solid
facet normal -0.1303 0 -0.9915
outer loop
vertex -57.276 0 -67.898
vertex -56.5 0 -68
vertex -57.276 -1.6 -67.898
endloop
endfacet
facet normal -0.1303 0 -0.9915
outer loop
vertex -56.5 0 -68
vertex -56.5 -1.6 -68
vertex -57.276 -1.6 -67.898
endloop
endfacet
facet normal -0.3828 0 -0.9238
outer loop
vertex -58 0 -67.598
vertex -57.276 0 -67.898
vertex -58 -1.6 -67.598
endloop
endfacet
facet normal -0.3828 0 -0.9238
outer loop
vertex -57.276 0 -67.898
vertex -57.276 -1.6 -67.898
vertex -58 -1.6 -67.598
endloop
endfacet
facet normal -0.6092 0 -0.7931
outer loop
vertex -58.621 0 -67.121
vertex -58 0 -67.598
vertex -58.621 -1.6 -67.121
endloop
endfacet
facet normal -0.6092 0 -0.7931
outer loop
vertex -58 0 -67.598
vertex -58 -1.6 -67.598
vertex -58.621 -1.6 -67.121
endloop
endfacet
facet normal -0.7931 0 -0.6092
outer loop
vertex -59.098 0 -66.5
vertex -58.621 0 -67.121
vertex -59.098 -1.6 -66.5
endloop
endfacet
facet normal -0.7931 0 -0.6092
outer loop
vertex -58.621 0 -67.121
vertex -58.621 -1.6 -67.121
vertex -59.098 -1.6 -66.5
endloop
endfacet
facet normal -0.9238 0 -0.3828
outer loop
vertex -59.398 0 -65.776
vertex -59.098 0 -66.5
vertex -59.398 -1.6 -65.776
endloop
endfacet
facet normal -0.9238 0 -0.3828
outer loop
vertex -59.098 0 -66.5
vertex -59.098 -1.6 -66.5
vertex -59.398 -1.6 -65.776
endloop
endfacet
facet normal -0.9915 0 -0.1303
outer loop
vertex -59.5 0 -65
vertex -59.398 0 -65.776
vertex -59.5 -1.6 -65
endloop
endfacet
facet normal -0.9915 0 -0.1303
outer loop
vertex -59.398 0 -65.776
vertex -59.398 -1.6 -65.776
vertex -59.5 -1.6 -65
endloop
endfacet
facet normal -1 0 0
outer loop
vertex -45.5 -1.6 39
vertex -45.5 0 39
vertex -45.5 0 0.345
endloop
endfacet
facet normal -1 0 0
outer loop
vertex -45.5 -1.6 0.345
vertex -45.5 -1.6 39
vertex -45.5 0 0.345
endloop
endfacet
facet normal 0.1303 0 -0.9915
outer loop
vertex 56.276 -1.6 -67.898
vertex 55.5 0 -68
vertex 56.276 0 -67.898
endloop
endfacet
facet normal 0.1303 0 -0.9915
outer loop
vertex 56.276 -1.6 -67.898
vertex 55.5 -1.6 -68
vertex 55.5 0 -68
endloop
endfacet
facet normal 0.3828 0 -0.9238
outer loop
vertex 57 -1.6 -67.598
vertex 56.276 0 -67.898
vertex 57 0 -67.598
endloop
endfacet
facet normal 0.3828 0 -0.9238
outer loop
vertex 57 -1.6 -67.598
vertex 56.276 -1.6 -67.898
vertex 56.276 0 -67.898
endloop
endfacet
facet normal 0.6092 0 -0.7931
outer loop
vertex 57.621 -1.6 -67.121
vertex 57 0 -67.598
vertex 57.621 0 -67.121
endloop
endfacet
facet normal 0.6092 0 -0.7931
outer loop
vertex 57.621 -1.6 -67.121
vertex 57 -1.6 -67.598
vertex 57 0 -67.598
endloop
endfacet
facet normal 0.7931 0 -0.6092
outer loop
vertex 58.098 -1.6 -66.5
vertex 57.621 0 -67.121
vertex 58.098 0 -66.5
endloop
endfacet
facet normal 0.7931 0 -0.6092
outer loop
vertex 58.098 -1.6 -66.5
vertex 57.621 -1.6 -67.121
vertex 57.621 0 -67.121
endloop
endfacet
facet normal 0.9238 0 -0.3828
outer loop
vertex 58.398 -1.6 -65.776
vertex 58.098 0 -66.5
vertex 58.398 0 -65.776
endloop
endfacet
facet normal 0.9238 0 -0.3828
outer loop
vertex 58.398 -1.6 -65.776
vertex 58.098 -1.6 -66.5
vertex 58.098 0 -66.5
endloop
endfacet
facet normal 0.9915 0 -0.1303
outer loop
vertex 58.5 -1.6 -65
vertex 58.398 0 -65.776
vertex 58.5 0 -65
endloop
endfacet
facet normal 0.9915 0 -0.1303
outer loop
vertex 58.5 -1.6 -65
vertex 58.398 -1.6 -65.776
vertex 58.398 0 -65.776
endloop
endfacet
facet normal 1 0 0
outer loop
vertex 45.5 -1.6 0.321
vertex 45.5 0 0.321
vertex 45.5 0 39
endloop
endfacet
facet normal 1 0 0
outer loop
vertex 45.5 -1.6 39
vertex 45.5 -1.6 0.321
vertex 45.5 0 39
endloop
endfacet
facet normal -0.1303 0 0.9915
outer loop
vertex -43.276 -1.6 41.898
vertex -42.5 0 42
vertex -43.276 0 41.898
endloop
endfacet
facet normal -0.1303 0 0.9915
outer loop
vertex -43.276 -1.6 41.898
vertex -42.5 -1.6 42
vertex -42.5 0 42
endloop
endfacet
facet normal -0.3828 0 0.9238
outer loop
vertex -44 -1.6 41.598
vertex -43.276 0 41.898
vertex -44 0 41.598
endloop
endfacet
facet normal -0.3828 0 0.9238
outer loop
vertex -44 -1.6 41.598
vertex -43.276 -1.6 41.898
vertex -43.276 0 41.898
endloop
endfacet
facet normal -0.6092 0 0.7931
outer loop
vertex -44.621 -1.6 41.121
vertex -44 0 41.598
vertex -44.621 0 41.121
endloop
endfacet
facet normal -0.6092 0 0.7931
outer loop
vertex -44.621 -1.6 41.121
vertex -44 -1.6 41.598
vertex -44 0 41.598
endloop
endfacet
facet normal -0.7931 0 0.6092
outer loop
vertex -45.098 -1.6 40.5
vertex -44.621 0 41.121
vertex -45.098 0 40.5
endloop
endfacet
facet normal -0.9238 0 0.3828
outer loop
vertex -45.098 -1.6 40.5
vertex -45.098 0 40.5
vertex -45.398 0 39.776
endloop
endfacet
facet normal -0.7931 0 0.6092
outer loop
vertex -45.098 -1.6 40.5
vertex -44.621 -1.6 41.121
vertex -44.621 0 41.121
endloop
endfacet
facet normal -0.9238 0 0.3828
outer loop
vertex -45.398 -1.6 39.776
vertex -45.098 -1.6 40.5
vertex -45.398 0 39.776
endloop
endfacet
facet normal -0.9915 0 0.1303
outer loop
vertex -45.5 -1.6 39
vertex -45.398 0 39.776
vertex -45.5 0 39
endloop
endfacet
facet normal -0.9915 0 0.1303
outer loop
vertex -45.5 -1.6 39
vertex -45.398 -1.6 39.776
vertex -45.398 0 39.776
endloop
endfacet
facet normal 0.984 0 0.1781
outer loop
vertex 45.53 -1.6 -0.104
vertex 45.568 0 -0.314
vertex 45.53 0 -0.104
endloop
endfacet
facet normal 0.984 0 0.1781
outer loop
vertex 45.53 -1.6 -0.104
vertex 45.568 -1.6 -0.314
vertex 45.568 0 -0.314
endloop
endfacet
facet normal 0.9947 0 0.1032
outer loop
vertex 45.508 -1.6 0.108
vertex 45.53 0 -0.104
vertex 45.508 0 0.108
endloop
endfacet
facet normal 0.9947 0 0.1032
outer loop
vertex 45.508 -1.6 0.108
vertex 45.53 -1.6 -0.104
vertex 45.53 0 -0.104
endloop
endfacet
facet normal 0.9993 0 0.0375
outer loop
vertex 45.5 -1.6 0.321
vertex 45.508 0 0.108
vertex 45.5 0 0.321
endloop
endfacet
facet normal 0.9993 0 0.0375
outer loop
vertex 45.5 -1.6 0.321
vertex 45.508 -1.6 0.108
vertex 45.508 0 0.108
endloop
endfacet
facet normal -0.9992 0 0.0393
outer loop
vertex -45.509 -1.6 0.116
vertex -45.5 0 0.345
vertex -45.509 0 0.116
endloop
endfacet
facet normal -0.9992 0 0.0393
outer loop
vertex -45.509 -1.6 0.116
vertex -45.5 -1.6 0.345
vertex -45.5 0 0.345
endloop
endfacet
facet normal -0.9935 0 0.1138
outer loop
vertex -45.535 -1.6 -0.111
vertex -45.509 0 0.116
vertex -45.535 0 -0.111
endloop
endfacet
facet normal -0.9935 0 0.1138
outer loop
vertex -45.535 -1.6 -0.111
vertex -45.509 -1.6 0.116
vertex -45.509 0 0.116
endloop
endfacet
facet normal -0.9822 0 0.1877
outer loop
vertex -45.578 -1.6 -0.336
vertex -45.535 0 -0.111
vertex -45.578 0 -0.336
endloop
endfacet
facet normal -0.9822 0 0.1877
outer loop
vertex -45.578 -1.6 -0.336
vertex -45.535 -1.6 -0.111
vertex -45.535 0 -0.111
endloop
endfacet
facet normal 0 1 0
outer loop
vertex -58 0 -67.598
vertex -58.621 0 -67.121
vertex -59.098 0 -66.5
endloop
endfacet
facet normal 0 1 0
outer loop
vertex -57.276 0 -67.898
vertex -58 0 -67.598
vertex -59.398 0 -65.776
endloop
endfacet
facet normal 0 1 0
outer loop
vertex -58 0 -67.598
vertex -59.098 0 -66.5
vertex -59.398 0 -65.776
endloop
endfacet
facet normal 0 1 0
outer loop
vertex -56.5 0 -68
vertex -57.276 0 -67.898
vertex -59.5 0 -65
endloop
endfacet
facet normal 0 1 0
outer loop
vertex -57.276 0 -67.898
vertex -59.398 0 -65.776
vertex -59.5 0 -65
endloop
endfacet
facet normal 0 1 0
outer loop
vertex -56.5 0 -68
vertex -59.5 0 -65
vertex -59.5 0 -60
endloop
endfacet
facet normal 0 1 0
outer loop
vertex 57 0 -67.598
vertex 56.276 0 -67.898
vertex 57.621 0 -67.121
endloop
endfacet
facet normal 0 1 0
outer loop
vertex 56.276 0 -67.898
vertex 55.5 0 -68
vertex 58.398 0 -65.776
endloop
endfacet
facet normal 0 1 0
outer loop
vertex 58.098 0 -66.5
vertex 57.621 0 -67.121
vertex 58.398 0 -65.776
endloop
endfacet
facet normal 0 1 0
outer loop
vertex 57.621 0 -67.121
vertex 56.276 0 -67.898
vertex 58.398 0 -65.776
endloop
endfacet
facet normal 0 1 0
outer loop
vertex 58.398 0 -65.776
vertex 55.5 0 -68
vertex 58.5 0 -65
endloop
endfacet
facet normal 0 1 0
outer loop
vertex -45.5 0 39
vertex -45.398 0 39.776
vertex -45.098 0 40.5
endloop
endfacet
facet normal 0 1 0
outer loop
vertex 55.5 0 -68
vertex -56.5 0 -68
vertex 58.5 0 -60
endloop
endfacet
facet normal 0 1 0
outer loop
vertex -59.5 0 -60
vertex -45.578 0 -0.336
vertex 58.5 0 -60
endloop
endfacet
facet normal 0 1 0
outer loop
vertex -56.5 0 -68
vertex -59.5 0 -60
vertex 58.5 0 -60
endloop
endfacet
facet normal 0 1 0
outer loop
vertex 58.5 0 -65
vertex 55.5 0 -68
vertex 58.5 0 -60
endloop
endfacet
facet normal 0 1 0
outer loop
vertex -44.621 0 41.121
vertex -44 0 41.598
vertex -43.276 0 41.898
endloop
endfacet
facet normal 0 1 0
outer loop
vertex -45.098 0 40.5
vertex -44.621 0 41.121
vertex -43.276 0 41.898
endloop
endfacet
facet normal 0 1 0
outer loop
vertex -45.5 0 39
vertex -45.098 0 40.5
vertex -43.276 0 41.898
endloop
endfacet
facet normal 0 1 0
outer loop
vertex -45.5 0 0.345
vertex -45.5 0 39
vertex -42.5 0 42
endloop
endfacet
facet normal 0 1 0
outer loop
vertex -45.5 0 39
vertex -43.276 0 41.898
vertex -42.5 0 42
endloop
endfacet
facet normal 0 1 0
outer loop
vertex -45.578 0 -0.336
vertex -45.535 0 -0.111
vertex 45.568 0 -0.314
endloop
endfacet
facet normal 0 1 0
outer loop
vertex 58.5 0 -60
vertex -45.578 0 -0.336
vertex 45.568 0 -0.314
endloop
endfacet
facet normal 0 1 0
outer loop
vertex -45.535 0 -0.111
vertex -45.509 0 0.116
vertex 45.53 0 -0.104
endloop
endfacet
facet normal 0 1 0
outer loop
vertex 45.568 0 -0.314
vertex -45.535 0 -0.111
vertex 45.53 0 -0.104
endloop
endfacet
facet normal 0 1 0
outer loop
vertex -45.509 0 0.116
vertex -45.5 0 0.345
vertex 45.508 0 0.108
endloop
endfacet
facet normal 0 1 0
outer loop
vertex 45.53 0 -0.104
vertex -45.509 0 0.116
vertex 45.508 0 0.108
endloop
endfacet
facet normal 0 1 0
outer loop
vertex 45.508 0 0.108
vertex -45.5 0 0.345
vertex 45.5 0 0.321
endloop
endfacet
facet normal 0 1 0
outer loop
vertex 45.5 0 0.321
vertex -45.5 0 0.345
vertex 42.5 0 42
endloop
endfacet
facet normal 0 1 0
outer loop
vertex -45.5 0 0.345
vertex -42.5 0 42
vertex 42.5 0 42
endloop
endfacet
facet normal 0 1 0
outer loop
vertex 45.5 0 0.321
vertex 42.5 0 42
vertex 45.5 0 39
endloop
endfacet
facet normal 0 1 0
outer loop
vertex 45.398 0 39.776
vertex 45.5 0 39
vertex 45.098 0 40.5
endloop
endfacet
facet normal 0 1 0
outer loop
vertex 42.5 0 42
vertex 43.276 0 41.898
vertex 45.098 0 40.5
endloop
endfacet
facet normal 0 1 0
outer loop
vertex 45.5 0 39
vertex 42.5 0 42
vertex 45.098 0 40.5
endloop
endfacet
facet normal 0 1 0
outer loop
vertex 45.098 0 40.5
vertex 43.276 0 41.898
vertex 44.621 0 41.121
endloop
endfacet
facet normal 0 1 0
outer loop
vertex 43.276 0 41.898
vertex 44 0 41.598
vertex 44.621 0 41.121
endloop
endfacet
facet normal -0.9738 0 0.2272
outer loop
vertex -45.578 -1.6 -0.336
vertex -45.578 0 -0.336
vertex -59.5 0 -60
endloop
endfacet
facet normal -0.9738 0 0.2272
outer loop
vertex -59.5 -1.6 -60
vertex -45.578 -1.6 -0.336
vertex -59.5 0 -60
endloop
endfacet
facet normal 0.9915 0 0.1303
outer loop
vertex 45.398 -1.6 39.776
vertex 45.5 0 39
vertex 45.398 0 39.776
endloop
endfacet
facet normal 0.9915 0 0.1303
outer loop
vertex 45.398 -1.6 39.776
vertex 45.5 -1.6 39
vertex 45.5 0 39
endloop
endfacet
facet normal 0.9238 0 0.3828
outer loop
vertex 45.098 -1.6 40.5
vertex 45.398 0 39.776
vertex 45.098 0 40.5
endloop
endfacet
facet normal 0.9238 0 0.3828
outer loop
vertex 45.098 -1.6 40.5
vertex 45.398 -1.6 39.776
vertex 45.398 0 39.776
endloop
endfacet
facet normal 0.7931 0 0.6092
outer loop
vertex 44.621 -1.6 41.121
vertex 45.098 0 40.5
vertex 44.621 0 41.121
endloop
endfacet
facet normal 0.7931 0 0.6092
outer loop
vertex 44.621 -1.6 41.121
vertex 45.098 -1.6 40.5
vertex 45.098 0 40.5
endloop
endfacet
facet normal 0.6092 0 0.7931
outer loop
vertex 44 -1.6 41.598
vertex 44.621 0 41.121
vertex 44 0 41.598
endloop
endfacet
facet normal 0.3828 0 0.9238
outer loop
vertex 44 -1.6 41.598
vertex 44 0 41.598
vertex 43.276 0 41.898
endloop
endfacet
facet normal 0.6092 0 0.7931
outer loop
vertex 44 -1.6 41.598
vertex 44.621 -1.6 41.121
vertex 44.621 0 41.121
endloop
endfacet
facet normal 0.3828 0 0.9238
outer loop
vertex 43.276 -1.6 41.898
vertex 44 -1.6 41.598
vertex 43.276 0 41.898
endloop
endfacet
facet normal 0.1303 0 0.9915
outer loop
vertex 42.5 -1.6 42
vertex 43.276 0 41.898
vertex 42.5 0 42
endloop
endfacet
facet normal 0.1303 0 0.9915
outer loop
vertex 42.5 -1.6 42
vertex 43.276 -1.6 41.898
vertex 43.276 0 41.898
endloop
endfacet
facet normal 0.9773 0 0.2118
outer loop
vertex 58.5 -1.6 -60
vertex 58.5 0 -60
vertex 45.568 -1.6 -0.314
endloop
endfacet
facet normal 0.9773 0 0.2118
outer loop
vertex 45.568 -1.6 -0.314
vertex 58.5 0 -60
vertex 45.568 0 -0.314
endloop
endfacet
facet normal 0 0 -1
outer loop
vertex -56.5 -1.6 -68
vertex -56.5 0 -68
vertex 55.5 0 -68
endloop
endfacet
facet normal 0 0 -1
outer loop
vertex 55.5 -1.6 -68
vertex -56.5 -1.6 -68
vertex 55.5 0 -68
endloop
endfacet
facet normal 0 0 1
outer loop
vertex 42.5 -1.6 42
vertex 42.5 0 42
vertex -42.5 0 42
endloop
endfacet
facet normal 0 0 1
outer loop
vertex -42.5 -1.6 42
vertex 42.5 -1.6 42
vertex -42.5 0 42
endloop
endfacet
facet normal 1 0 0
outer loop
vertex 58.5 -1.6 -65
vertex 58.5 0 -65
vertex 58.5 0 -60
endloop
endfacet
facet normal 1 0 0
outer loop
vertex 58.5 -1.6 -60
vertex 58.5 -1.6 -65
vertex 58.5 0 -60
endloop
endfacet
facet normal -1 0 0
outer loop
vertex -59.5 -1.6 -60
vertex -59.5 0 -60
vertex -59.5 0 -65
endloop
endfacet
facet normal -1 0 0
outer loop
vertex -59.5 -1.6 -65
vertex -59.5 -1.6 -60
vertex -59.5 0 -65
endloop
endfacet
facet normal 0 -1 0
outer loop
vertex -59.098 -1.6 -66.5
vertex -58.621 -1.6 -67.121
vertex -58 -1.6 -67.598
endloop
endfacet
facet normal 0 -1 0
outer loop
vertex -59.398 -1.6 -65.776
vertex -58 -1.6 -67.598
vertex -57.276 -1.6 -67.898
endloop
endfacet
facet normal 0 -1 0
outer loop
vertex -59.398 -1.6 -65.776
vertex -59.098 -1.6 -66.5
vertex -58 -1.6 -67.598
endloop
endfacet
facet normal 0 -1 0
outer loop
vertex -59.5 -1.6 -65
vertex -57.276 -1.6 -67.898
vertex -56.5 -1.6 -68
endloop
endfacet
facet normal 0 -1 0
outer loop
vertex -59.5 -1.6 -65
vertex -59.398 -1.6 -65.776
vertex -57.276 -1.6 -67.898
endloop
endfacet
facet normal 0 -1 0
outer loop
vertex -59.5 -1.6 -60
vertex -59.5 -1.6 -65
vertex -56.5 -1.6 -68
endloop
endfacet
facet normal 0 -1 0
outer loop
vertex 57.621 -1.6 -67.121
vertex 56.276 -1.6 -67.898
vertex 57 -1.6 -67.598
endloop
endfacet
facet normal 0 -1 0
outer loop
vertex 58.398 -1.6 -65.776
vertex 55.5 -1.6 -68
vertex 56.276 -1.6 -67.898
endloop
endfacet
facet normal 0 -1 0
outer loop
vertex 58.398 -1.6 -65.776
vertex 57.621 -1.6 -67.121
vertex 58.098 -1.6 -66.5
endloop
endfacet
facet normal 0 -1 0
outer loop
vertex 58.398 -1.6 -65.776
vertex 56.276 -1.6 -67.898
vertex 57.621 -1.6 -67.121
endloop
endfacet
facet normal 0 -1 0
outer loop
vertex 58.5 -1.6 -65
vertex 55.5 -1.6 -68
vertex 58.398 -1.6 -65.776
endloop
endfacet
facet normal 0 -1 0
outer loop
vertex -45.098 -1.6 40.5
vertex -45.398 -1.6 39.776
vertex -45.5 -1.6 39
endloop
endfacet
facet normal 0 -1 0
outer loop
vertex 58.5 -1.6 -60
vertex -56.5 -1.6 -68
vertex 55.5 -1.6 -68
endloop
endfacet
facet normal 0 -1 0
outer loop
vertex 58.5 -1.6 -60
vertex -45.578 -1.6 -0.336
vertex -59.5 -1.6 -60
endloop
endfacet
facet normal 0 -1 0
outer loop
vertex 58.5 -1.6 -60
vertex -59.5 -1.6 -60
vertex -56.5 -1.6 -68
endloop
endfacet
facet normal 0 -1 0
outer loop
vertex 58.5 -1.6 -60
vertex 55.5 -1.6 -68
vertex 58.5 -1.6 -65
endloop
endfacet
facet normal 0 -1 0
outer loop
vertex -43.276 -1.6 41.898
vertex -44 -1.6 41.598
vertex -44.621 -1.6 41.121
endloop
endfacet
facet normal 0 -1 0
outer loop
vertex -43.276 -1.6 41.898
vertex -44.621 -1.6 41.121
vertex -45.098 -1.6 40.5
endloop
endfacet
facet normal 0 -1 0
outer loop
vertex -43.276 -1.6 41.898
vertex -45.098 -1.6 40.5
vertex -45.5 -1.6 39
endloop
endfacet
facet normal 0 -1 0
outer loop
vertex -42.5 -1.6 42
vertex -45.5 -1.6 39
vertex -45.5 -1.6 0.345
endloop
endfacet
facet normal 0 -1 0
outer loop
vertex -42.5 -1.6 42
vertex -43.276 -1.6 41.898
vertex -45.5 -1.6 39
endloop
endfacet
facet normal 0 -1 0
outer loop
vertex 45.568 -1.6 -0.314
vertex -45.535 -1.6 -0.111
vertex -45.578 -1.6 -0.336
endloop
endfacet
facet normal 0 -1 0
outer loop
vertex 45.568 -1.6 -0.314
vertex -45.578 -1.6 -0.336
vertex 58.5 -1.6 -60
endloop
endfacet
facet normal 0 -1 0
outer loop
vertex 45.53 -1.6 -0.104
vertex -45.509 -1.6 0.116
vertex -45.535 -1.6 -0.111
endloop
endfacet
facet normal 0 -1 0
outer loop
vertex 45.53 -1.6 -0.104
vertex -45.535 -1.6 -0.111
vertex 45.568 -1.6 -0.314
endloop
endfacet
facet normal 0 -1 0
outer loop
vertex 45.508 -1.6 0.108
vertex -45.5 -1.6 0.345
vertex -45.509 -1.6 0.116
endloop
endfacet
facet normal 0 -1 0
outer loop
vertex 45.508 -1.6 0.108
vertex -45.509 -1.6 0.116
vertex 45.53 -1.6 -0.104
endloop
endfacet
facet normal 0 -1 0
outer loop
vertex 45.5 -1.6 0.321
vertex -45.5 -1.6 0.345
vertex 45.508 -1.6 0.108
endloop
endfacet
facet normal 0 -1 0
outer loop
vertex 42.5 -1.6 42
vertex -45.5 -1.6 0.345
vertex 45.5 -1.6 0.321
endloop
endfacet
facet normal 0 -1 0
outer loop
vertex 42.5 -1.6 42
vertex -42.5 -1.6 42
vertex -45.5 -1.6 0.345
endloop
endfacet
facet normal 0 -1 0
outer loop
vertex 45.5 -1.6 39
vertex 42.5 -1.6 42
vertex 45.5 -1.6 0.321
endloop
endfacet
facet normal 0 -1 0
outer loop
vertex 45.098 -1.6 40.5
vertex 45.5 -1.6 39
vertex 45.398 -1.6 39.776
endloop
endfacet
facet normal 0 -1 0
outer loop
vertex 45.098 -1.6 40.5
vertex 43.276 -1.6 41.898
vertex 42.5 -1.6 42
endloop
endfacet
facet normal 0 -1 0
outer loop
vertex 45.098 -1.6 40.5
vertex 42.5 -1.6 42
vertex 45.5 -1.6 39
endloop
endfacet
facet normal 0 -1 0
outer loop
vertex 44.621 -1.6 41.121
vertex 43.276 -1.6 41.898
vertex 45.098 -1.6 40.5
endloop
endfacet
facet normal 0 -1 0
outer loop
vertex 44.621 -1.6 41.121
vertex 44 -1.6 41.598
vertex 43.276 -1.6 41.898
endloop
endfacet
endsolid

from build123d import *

# Parameters (mm, degrees)
F1_DEPTH = 1.6
F2_R     = 3


with BuildPart() as f1:
    # F0 (on Front) → F1 (new body)
    with BuildSketch(Plane.XZ):
        Polygon((-59.5, -68), (58.5, -68), (58.5, -60), (45.5, 0), (45.5, 42), (-45.5, 42), (-45.5, 0), (-59.5, -60), align=None)
    extrude(amount=F1_DEPTH)

    # F2
    f2_edges = [f1.edges().sort_by_distance(p)[0] for p in [
        (-59.5, -0.8, -68),
        (58.5, -0.8, -68),
        (-45.5, -0.8, 42),
        (45.5, -0.8, 42),
        (45.5, -0.8, 0),
        (-45.5, -0.8, 0),
    ]]
    fillet(f2_edges, radius=F2_R)


solid = f1.part
